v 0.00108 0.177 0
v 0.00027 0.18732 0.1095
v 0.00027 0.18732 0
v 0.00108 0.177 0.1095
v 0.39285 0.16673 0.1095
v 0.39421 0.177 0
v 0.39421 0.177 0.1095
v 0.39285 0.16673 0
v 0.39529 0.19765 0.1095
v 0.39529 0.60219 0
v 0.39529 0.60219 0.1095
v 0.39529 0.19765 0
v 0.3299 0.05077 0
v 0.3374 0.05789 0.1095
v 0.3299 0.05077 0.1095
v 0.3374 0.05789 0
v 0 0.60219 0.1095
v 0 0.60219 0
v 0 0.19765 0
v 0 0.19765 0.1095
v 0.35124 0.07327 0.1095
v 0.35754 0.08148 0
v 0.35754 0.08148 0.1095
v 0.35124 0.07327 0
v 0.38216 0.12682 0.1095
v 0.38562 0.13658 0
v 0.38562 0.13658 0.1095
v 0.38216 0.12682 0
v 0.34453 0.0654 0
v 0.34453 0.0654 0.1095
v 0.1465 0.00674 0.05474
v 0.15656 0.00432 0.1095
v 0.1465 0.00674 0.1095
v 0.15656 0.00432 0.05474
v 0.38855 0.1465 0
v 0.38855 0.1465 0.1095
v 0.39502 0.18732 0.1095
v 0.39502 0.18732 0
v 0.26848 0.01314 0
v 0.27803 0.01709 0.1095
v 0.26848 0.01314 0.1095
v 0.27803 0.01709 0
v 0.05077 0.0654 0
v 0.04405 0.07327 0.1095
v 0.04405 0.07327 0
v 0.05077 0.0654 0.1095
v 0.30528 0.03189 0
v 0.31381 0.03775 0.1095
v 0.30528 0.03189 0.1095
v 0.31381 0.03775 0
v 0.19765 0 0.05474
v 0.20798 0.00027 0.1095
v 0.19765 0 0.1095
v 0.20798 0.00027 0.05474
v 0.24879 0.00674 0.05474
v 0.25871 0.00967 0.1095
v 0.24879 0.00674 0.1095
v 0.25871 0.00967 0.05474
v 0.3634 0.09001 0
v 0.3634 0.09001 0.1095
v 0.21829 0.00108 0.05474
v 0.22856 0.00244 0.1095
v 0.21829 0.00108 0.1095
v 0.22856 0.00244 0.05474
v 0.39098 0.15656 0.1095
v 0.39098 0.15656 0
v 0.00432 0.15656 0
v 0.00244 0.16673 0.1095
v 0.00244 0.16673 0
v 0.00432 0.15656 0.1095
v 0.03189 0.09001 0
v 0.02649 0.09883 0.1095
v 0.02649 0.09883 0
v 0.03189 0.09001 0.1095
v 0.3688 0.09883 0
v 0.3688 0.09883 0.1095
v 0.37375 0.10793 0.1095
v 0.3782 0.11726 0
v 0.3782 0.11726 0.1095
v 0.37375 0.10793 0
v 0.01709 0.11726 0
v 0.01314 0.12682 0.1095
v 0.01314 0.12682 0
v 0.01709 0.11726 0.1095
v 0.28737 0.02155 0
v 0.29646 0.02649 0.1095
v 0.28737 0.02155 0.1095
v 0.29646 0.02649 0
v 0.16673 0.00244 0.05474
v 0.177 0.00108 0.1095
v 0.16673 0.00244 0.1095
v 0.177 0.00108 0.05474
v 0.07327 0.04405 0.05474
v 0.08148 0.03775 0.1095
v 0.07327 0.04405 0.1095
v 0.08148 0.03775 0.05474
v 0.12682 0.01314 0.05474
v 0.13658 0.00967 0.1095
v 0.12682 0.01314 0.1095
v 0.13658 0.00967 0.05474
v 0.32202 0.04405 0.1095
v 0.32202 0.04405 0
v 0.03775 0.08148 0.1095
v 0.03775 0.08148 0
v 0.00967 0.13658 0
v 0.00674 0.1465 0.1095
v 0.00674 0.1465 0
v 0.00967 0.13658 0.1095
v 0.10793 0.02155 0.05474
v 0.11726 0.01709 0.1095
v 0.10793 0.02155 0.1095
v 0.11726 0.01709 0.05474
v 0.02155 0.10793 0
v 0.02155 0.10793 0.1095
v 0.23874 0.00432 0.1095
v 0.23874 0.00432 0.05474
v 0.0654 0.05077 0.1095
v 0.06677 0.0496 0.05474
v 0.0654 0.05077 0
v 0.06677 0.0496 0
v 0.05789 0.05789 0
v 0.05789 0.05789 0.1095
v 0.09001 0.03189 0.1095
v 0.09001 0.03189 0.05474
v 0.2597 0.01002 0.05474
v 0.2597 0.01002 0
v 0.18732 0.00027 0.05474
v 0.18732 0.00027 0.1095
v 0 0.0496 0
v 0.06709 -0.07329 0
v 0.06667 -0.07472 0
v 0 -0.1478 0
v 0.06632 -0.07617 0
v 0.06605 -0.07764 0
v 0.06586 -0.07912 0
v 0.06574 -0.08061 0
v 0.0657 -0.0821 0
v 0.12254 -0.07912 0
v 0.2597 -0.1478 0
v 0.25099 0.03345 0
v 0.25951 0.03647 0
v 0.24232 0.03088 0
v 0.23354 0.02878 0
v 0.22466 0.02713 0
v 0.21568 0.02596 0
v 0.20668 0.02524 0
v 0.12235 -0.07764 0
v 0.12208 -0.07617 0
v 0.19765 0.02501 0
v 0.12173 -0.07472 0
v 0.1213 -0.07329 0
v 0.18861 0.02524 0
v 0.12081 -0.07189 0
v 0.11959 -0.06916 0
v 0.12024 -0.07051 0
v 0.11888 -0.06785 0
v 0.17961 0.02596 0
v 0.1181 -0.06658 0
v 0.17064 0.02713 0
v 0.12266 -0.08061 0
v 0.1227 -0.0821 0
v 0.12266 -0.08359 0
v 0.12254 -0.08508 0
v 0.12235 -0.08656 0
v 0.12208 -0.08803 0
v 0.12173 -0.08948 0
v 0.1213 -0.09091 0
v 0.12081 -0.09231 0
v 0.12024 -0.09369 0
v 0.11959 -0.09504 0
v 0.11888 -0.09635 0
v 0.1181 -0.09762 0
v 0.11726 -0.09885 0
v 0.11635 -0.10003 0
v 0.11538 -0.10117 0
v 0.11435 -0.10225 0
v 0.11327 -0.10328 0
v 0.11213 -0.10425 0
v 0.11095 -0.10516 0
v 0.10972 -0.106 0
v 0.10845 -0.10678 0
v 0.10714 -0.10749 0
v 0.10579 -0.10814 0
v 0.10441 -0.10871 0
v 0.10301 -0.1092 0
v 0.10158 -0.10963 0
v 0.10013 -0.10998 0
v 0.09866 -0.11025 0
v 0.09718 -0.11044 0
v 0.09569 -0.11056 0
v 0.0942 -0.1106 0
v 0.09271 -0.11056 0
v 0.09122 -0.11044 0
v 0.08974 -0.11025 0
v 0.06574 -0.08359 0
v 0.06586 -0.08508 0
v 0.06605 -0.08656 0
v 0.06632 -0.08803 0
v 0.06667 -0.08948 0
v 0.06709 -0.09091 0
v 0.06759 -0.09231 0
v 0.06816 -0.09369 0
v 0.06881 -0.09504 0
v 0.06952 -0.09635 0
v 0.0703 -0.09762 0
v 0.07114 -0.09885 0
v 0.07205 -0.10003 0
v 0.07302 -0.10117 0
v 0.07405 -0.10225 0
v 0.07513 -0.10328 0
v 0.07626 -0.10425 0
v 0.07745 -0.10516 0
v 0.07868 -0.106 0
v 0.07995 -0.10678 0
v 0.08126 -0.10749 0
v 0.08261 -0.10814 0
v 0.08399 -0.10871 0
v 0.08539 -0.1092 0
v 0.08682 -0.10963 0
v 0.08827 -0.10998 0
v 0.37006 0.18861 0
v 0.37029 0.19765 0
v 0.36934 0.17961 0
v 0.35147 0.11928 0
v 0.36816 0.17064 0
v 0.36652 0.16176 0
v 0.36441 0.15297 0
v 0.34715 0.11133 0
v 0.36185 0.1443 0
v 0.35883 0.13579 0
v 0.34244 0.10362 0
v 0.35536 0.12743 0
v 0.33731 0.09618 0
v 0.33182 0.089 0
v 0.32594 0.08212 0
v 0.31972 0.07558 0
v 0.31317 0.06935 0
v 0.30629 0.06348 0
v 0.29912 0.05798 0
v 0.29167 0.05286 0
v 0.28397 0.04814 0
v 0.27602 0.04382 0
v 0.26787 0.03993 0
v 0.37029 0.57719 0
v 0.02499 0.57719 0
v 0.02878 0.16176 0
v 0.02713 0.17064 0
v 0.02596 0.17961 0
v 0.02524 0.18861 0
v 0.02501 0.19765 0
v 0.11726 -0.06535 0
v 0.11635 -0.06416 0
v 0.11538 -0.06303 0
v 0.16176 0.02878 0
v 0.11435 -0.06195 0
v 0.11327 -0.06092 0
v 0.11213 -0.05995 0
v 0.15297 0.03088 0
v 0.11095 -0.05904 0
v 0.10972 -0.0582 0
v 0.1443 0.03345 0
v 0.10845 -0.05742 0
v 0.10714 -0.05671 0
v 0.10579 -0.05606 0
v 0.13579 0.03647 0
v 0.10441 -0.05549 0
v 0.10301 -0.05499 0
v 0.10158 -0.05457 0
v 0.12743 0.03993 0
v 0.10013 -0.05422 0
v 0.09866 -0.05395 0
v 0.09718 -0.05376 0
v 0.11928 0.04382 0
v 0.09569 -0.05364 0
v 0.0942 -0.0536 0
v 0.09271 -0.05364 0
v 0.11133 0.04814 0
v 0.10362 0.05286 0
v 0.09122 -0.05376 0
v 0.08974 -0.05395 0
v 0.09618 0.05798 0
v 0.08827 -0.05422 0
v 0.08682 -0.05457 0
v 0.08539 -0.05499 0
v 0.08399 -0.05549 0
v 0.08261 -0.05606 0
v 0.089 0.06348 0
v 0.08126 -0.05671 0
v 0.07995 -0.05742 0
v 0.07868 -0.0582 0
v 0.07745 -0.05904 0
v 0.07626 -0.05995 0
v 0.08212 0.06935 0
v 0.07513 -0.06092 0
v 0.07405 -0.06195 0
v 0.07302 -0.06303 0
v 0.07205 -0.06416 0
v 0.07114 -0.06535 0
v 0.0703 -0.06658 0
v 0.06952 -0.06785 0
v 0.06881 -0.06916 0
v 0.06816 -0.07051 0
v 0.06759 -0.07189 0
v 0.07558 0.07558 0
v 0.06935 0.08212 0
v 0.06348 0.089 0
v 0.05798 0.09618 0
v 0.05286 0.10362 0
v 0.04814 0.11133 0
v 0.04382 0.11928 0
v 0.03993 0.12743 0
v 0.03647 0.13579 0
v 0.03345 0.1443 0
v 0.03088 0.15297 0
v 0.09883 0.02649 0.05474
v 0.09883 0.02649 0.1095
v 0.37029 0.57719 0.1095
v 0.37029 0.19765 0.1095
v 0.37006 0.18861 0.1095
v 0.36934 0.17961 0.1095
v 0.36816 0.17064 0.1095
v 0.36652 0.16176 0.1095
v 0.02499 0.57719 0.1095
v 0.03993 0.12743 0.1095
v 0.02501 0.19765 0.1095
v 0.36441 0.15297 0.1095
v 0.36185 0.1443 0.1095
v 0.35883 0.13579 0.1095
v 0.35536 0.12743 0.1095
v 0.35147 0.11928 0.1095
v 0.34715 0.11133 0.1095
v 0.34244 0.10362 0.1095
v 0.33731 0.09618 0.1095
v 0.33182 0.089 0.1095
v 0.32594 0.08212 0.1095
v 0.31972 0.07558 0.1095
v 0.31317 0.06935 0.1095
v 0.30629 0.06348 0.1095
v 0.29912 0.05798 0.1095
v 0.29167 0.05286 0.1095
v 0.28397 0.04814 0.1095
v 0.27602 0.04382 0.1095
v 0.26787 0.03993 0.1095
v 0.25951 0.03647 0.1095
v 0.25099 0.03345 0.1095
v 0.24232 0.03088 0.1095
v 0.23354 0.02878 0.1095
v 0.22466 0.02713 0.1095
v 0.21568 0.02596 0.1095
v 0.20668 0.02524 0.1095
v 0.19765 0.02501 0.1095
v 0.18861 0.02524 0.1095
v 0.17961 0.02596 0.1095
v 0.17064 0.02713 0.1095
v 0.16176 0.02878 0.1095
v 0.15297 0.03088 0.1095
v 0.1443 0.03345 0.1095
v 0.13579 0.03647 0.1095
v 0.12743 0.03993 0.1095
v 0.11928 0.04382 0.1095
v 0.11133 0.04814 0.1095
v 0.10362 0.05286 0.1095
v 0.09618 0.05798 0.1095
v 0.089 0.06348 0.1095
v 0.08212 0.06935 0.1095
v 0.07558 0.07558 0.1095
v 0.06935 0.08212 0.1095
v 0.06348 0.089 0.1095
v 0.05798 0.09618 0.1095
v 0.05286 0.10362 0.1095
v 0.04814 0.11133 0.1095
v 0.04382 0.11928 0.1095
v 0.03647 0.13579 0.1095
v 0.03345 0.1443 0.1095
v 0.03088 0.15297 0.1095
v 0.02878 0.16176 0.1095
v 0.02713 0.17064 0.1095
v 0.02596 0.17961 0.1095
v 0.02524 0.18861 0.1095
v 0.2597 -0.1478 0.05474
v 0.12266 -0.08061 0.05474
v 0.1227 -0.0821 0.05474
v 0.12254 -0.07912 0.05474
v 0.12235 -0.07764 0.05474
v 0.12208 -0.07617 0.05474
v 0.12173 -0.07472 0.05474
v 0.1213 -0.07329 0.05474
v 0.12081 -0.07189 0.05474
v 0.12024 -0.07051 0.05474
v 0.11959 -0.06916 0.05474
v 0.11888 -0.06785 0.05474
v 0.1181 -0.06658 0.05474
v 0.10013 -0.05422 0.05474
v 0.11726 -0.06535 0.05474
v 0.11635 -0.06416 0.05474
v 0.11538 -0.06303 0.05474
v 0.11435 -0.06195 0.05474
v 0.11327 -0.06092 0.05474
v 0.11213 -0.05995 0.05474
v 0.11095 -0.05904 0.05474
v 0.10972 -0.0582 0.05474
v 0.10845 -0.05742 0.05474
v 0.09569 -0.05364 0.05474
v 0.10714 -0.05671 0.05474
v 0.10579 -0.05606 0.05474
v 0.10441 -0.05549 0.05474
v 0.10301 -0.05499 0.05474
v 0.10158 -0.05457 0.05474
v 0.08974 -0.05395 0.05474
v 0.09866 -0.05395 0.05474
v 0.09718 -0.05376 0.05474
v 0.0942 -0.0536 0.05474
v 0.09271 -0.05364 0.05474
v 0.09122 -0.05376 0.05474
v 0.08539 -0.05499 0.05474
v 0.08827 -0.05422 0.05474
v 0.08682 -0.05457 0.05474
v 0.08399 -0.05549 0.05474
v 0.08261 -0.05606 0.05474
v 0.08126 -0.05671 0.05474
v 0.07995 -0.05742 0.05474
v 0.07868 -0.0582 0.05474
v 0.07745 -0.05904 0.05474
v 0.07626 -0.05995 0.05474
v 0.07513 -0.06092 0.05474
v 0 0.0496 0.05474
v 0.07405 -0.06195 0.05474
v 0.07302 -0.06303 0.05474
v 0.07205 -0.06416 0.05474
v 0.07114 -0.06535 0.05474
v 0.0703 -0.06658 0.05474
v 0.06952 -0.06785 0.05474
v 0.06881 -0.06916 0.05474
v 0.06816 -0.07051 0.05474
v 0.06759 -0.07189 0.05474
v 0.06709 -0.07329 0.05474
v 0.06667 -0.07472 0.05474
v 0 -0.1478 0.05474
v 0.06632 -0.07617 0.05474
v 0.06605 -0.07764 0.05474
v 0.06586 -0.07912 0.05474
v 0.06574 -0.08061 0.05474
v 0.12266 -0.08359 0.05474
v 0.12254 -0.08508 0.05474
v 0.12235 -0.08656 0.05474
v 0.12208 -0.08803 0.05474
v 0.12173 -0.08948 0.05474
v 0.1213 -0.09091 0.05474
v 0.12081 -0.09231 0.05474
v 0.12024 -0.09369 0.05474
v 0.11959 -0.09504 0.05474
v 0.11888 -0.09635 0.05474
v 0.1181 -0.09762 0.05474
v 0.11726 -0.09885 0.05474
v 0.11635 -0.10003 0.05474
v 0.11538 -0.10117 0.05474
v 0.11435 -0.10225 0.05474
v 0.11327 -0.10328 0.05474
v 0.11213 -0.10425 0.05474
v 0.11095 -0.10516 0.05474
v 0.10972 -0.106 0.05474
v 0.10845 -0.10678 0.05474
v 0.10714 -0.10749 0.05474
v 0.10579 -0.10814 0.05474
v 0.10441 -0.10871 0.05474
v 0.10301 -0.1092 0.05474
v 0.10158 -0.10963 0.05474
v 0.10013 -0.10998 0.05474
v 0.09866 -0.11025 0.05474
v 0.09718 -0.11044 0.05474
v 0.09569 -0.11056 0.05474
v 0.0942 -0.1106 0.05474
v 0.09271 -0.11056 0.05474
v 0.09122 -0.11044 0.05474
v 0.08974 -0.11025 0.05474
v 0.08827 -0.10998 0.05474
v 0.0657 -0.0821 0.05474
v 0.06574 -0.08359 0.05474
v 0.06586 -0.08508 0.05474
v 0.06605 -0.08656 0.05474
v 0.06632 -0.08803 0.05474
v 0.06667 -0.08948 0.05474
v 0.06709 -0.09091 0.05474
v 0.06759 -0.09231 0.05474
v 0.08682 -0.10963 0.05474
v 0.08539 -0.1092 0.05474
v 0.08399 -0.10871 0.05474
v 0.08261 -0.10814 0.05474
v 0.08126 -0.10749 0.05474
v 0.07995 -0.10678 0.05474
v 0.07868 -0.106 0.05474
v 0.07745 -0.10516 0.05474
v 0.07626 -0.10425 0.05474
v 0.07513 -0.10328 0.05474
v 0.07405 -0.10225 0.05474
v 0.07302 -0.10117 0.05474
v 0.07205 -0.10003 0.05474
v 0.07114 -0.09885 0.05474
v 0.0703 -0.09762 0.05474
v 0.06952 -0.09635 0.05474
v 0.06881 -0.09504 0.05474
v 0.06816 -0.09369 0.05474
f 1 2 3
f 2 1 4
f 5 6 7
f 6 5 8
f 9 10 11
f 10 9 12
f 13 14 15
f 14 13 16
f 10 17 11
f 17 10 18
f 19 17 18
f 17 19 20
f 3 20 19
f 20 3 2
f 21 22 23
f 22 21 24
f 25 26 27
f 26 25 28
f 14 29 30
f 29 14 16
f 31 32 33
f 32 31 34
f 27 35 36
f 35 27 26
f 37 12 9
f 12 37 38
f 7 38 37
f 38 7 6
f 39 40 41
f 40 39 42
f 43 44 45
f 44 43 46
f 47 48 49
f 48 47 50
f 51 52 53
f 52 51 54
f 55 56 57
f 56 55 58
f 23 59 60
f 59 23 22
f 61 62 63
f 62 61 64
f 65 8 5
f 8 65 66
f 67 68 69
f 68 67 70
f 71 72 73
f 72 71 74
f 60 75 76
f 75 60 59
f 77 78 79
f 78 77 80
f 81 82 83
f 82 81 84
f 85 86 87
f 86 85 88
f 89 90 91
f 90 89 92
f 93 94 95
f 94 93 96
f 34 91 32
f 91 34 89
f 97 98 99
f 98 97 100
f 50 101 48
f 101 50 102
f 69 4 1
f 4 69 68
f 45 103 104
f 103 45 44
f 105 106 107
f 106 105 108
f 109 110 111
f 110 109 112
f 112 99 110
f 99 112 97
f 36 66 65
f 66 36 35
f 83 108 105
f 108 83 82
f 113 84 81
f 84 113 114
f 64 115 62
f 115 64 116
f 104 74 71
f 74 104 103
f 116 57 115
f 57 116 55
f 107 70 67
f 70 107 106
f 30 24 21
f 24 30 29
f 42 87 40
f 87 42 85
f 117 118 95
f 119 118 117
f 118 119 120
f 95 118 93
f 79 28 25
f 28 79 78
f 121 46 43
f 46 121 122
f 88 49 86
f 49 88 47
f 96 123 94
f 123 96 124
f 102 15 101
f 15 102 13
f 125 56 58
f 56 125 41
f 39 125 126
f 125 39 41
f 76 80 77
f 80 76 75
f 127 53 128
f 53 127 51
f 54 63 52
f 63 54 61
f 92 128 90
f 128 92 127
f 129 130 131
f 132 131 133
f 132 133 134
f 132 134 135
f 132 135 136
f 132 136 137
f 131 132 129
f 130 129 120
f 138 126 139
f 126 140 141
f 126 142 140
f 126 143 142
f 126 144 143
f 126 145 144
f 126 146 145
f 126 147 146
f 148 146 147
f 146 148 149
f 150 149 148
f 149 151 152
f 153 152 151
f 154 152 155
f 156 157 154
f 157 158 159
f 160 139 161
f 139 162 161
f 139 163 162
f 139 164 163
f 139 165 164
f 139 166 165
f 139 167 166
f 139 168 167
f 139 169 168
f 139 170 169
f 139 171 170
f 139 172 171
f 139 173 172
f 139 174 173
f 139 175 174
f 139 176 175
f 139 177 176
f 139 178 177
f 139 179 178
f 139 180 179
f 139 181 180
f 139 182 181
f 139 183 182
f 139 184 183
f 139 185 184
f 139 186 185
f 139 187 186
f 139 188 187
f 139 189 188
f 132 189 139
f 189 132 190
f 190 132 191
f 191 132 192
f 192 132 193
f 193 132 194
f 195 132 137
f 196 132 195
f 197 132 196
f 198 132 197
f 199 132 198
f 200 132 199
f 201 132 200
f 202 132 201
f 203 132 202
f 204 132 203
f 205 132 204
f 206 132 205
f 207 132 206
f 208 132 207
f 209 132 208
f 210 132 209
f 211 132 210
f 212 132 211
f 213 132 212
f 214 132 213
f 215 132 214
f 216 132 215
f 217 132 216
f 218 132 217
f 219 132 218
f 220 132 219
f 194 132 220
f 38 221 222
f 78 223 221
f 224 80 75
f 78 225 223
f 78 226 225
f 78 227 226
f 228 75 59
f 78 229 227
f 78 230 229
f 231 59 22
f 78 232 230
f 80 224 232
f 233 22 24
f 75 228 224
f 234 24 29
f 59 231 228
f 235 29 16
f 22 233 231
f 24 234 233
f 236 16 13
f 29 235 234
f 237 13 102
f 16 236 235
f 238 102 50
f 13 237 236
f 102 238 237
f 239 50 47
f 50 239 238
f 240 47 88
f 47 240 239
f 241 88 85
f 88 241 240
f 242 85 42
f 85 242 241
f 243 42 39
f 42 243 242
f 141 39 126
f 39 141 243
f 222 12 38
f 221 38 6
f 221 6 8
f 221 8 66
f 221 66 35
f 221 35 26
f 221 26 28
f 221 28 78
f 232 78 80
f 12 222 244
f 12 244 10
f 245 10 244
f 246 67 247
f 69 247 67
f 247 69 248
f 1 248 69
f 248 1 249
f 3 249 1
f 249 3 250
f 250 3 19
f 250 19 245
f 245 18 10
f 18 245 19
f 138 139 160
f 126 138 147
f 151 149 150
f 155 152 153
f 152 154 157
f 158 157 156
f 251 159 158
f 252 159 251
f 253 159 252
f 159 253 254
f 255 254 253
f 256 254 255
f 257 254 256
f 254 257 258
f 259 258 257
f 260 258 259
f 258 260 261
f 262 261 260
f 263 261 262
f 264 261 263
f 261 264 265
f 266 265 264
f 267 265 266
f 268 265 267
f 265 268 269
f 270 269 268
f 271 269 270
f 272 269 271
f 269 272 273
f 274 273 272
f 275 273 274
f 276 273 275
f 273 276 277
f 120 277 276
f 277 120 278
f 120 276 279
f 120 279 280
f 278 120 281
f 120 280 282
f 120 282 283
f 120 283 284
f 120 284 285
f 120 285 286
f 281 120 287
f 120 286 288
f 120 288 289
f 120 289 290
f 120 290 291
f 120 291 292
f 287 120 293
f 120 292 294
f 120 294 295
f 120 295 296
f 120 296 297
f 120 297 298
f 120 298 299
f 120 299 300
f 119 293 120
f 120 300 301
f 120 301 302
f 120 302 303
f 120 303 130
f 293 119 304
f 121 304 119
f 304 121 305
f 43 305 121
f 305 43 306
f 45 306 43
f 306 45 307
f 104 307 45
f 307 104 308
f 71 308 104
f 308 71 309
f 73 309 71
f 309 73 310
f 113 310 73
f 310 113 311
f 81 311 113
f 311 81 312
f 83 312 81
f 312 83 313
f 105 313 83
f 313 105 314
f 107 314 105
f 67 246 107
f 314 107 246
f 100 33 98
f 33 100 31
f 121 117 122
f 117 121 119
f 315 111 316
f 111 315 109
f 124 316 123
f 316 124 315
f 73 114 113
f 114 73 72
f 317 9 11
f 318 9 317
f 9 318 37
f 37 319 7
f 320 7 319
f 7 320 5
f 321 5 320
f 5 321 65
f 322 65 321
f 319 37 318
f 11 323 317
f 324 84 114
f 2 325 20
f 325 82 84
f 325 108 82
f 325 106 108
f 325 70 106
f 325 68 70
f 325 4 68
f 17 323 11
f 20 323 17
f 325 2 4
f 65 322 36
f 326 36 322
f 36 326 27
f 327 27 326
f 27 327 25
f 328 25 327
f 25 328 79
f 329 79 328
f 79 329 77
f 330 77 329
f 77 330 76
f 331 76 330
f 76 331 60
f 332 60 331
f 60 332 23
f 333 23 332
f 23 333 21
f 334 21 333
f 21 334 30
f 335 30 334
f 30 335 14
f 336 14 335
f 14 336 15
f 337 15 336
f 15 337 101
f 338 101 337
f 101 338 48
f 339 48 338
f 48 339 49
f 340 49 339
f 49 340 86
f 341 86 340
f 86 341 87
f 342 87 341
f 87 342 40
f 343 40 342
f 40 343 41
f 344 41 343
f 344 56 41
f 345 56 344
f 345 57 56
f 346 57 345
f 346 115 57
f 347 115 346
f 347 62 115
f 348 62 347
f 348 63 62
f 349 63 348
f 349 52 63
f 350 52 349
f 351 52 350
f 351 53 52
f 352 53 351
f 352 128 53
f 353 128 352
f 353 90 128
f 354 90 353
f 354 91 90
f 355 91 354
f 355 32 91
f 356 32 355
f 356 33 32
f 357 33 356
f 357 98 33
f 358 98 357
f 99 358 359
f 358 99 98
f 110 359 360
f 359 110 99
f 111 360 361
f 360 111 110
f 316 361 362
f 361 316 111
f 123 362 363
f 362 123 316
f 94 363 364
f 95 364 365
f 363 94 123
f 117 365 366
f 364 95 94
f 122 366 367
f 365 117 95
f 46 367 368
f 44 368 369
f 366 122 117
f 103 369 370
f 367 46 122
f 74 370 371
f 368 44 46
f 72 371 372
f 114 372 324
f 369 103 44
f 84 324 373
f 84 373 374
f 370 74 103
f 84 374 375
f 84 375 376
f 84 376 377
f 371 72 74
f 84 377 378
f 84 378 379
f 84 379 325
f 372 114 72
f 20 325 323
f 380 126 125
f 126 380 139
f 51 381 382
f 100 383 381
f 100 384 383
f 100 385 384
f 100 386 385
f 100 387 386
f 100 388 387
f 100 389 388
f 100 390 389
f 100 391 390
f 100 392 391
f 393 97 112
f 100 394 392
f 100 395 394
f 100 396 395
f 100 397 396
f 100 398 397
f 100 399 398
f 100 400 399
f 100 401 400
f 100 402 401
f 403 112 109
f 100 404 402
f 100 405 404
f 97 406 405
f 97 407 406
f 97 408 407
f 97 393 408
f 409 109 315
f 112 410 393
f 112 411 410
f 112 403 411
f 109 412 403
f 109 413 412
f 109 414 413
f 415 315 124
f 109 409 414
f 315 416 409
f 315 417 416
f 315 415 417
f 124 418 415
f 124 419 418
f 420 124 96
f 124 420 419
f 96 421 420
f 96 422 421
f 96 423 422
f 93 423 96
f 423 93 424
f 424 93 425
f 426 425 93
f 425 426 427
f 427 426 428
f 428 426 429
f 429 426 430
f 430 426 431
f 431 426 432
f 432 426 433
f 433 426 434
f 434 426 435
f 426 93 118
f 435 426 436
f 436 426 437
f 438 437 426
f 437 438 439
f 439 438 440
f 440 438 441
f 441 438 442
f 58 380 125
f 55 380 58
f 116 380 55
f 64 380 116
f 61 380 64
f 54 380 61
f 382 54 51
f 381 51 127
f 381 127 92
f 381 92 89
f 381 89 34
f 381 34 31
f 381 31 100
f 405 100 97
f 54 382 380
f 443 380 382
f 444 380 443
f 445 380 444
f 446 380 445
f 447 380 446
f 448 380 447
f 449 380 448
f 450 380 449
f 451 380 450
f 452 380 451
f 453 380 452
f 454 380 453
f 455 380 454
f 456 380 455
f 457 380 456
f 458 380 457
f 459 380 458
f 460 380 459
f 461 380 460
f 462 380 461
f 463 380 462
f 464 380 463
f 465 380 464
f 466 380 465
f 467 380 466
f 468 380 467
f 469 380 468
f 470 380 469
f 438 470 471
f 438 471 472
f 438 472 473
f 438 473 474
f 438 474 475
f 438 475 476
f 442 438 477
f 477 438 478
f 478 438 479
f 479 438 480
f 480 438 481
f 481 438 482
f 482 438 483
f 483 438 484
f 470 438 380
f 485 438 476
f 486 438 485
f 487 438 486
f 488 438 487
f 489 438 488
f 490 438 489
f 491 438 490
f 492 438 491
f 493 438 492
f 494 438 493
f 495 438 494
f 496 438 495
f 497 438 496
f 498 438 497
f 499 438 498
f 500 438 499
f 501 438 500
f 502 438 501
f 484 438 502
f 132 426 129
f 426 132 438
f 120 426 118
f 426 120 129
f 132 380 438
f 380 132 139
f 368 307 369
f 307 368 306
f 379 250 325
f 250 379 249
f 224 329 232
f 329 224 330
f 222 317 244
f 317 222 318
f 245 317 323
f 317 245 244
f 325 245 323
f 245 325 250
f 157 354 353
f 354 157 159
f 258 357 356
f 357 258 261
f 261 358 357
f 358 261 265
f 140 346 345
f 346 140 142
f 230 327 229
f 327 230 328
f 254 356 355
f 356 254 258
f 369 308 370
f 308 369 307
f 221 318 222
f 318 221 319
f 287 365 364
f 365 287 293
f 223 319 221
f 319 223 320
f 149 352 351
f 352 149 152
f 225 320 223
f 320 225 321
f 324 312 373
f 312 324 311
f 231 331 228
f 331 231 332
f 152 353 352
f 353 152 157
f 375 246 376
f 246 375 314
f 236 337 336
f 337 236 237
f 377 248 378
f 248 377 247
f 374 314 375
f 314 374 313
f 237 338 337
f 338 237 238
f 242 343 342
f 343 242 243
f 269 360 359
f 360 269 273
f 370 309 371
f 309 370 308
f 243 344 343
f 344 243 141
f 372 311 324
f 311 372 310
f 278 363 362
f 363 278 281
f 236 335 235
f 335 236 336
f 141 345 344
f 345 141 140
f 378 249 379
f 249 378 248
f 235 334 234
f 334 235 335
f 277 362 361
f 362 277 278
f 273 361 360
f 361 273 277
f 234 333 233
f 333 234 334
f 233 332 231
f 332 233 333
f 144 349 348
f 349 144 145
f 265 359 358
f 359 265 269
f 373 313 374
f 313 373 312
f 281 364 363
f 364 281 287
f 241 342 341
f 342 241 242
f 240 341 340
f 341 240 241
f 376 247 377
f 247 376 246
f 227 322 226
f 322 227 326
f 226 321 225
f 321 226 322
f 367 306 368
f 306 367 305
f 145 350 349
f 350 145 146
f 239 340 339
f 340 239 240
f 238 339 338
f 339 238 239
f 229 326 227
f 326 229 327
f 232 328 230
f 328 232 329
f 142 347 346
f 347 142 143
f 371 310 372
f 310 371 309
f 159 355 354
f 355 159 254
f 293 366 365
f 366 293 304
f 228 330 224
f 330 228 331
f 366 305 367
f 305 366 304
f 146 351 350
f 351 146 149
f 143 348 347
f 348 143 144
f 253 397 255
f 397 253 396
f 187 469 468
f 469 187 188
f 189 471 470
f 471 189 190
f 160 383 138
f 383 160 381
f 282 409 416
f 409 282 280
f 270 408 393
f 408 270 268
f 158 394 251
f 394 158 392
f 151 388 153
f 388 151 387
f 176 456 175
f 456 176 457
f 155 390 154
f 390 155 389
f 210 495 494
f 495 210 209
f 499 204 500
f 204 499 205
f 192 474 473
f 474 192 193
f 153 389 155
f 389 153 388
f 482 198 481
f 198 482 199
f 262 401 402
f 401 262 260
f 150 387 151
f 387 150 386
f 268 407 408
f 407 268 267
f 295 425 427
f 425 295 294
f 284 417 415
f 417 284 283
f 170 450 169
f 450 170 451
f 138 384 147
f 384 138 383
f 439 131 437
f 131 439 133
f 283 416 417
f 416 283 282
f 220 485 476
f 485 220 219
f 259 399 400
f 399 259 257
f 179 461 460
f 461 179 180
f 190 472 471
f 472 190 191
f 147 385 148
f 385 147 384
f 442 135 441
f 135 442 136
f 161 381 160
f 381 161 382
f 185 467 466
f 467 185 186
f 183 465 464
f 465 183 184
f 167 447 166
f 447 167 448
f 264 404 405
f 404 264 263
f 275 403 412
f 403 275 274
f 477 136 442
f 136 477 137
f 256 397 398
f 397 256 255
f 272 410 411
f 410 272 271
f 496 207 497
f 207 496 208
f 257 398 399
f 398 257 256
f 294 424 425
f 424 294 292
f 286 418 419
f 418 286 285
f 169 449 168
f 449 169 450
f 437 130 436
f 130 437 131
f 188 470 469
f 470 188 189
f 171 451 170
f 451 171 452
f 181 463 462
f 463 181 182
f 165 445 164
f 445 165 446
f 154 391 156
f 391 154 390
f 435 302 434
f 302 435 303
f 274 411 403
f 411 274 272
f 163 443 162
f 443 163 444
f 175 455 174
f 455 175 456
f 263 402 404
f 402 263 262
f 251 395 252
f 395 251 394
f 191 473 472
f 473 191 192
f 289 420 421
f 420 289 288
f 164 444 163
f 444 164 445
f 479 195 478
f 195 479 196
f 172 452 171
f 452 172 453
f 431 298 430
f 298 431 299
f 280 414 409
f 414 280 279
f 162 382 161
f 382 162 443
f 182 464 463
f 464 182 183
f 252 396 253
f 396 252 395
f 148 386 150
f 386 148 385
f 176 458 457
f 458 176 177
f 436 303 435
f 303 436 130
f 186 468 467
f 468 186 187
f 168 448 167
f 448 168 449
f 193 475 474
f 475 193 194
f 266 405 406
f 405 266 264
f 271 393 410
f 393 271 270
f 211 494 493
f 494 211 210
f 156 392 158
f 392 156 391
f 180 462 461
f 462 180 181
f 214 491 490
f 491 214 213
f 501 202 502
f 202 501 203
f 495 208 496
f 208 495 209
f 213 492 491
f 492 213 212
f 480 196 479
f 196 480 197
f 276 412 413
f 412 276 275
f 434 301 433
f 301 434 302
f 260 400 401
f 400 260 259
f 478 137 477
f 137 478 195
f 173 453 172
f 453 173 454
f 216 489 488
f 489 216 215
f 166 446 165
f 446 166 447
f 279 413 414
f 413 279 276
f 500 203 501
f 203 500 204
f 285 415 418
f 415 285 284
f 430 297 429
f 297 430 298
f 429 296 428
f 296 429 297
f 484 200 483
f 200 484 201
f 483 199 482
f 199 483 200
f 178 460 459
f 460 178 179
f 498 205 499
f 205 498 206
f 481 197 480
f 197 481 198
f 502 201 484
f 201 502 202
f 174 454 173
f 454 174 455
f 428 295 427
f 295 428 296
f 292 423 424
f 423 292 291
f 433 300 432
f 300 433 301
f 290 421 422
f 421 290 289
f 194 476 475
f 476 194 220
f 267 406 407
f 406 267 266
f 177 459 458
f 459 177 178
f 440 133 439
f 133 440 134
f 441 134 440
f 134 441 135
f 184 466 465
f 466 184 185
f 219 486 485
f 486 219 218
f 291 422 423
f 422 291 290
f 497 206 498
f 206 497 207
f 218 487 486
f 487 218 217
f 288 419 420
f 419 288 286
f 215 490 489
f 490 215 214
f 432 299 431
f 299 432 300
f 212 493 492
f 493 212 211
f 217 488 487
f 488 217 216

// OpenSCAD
// D-Shaped Frame with Protrusion and Circular Cut

// Main base reference dimensions
main_length = 0.395255;
main_width  = 0.60219;
main_height = 0.109489;
extrusion_depth = 0.1095;

// D-shape footprint (flush with main base edges)
d_length = 0.3953;
d_width  = 0.6022;

// Frame wall thickness
wall_t = 0.025;

// Protrusion bounding box (edge offsets from main base)
prot_x0 = 0;
prot_x1 = d_length - 0.1356;   // 0.2597
prot_y0 = -0.1478;             // extends beyond front
prot_y1 = d_width - 0.5526;    // 0.0496
prot_h  = 0.054745;

// Coaxial circular profile
circ_cx      = 0.0942;
circ_cy      = -0.0821;
circ_r_outer = 0.0657;
circ_r_cut   = 0.0285;
circ_h       = 0.0547;

$fn = 120;

// D-shape 2D profile: flat back at high y, semicircular front at low y
module d_shape_2d(len, wid, inset=0) {
    r  = len/2 - inset;
    cx = len/2;
    cy = len/2;
    union() {
        // Straight rectangle (sides + back)
        translate([inset, cy])
            square([len - 2*inset, wid - cy - inset]);
        // Lower semicircle (curved front wall)
        translate([cx, cy])
            intersection() {
                circle(r = r);
                translate([-(r+1), -(r+1)])
                    square([2*(r+1), r+1]);
            }
    }
}

// Main assembly
difference() {
    union() {
        // D-shaped frame body
        linear_extrude(height = extrusion_depth)
            d_shape_2d(d_length, d_width);
        // Shallow protrusion block attached to frame front
        translate([prot_x0, prot_y0, 0])
            cube([prot_x1 - prot_x0,
                  prot_y1 - prot_y0,
                  prot_h]);
    }
    // Inner through-opening (continuous through frame and protrusion)
    translate([0, 0, -0.001])
        linear_extrude(height = extrusion_depth + 0.002)
            d_shape_2d(d_length, d_width, wall_t);
    // Concentric circular cut through protrusion band
    translate([circ_cx, circ_cy, -0.001])
        cylinder(h = circ_h + 0.002, r = circ_r_cut);
}
